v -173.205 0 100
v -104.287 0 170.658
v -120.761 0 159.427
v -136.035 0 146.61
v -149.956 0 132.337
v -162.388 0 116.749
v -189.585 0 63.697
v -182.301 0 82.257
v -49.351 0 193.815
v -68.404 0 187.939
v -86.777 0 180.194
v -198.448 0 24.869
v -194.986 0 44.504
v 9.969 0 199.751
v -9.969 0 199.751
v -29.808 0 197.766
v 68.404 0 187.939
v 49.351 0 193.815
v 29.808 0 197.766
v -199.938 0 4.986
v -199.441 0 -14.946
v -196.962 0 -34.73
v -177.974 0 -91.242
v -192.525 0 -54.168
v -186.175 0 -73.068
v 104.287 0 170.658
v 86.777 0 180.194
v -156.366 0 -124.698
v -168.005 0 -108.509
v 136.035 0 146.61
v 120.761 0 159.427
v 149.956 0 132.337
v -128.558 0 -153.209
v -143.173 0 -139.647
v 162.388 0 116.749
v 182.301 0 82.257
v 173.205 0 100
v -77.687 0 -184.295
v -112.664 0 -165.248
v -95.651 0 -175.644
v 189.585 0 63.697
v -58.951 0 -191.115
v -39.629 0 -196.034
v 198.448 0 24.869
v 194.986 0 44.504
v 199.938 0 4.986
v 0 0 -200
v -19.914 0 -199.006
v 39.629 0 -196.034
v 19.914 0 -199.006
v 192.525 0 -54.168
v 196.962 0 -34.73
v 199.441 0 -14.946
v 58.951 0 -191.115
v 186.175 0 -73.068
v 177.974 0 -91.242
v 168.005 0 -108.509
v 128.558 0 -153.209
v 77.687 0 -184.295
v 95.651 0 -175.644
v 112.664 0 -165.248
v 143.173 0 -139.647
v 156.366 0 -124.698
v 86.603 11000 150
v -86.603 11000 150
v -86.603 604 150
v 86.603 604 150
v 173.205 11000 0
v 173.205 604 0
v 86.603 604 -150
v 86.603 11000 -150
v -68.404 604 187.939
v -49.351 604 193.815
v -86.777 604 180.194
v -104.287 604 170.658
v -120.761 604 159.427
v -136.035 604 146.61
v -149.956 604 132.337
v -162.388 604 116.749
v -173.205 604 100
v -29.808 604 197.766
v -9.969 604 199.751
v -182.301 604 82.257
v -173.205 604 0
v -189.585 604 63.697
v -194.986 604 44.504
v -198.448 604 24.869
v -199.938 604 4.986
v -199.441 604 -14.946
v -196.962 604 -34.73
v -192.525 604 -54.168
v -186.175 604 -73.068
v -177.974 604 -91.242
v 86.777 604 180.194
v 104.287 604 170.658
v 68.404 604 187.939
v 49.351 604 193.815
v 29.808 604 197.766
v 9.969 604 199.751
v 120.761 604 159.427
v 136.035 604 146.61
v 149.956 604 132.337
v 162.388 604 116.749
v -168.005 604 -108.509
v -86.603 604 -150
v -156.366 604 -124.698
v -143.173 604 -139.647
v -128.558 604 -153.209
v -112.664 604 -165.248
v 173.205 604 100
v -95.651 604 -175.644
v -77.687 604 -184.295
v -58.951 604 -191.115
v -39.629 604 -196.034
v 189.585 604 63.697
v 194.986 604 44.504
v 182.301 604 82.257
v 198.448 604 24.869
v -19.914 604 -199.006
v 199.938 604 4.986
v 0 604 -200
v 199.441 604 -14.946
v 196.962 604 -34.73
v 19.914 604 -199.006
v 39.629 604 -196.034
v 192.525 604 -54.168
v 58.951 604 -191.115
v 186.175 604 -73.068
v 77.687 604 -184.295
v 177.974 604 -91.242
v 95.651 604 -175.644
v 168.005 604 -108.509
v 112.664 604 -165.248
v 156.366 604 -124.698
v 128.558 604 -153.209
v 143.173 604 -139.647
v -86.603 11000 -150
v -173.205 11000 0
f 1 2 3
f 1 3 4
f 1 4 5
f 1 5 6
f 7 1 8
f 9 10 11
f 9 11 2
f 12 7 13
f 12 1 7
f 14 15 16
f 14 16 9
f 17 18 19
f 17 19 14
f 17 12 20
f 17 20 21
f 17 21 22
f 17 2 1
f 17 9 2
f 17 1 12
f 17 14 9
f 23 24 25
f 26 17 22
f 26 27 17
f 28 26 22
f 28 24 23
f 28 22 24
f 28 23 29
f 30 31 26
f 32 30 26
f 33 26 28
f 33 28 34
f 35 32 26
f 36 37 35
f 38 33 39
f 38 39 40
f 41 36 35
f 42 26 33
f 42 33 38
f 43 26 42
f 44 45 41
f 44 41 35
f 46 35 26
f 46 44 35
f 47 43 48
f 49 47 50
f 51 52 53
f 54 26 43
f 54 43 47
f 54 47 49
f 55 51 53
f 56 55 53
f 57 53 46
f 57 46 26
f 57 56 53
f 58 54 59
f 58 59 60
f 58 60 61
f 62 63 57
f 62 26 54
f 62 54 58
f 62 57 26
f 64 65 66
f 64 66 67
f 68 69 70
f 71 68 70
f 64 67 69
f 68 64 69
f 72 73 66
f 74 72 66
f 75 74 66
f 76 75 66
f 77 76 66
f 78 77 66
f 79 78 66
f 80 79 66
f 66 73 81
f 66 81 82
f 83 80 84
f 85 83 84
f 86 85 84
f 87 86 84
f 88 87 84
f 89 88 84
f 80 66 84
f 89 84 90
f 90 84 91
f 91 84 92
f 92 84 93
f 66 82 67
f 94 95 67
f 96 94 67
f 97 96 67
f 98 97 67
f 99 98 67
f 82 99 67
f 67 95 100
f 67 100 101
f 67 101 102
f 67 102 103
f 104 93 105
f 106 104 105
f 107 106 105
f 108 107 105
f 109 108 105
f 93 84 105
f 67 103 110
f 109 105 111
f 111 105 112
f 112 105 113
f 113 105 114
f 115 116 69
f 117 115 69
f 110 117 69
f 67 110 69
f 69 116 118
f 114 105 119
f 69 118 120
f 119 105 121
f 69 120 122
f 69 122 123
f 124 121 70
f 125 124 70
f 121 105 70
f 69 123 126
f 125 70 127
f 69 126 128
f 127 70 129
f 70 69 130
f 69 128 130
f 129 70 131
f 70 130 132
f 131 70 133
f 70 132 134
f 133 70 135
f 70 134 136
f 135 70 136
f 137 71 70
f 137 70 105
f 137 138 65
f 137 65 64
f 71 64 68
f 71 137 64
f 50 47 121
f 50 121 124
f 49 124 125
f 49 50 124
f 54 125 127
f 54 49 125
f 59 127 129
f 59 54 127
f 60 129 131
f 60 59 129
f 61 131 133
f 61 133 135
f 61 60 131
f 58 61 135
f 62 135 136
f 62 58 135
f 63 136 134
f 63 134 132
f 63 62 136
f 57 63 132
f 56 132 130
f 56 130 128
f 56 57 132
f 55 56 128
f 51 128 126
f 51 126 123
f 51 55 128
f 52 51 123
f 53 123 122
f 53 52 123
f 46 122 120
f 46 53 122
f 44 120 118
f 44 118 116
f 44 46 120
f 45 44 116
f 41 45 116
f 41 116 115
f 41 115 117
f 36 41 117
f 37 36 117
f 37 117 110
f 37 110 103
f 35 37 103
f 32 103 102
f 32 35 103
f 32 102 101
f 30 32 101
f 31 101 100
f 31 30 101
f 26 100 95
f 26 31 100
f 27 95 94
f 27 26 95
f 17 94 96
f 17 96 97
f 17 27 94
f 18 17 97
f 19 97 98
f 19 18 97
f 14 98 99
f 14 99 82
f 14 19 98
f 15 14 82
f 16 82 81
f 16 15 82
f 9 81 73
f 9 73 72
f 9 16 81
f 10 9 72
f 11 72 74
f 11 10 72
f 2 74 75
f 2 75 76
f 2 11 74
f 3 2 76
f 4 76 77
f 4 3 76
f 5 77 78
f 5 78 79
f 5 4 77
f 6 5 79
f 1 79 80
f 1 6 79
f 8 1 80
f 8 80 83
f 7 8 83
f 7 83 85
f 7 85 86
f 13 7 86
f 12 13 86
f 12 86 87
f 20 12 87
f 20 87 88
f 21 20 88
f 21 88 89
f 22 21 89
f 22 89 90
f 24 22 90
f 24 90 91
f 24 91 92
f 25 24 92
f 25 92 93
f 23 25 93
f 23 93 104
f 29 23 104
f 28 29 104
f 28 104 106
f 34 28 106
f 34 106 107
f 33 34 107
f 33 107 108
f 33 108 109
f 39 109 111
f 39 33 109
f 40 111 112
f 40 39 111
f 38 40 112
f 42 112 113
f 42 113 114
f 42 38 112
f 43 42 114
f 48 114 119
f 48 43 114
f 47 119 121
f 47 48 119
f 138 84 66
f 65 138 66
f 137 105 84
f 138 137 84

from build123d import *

# Parameters (mm, degrees)
SALIENTE_EXTRUIR1_DEPTH = 11000
CROQUIS2_R              = 200
SALIENTE_EXTRUIR2_DEPTH = 604


with BuildPart() as part:
    # Croquis1 → Saliente-Extruir1 (new body)
    with BuildSketch(Plane(origin=(0, 0, 0), x_dir=(1, 0, 0), z_dir=(0, 1, 0))):
        Polygon((173.205080757, 0), (86.602540378, 150), (-86.602540378, 150), (-173.205080757, 0), (-86.602540378, -150), (86.602540378, -150), align=None)
    extrude(amount=SALIENTE_EXTRUIR1_DEPTH)

    # Croquis2 → Saliente-Extruir2 (add)
    with BuildSketch(Plane.XZ):
        with Locations(Location((0, 0, 0), (0, 0, 270))):
            Circle(CROQUIS2_R)
    extrude(amount=-SALIENTE_EXTRUIR2_DEPTH)


solid = part.part
